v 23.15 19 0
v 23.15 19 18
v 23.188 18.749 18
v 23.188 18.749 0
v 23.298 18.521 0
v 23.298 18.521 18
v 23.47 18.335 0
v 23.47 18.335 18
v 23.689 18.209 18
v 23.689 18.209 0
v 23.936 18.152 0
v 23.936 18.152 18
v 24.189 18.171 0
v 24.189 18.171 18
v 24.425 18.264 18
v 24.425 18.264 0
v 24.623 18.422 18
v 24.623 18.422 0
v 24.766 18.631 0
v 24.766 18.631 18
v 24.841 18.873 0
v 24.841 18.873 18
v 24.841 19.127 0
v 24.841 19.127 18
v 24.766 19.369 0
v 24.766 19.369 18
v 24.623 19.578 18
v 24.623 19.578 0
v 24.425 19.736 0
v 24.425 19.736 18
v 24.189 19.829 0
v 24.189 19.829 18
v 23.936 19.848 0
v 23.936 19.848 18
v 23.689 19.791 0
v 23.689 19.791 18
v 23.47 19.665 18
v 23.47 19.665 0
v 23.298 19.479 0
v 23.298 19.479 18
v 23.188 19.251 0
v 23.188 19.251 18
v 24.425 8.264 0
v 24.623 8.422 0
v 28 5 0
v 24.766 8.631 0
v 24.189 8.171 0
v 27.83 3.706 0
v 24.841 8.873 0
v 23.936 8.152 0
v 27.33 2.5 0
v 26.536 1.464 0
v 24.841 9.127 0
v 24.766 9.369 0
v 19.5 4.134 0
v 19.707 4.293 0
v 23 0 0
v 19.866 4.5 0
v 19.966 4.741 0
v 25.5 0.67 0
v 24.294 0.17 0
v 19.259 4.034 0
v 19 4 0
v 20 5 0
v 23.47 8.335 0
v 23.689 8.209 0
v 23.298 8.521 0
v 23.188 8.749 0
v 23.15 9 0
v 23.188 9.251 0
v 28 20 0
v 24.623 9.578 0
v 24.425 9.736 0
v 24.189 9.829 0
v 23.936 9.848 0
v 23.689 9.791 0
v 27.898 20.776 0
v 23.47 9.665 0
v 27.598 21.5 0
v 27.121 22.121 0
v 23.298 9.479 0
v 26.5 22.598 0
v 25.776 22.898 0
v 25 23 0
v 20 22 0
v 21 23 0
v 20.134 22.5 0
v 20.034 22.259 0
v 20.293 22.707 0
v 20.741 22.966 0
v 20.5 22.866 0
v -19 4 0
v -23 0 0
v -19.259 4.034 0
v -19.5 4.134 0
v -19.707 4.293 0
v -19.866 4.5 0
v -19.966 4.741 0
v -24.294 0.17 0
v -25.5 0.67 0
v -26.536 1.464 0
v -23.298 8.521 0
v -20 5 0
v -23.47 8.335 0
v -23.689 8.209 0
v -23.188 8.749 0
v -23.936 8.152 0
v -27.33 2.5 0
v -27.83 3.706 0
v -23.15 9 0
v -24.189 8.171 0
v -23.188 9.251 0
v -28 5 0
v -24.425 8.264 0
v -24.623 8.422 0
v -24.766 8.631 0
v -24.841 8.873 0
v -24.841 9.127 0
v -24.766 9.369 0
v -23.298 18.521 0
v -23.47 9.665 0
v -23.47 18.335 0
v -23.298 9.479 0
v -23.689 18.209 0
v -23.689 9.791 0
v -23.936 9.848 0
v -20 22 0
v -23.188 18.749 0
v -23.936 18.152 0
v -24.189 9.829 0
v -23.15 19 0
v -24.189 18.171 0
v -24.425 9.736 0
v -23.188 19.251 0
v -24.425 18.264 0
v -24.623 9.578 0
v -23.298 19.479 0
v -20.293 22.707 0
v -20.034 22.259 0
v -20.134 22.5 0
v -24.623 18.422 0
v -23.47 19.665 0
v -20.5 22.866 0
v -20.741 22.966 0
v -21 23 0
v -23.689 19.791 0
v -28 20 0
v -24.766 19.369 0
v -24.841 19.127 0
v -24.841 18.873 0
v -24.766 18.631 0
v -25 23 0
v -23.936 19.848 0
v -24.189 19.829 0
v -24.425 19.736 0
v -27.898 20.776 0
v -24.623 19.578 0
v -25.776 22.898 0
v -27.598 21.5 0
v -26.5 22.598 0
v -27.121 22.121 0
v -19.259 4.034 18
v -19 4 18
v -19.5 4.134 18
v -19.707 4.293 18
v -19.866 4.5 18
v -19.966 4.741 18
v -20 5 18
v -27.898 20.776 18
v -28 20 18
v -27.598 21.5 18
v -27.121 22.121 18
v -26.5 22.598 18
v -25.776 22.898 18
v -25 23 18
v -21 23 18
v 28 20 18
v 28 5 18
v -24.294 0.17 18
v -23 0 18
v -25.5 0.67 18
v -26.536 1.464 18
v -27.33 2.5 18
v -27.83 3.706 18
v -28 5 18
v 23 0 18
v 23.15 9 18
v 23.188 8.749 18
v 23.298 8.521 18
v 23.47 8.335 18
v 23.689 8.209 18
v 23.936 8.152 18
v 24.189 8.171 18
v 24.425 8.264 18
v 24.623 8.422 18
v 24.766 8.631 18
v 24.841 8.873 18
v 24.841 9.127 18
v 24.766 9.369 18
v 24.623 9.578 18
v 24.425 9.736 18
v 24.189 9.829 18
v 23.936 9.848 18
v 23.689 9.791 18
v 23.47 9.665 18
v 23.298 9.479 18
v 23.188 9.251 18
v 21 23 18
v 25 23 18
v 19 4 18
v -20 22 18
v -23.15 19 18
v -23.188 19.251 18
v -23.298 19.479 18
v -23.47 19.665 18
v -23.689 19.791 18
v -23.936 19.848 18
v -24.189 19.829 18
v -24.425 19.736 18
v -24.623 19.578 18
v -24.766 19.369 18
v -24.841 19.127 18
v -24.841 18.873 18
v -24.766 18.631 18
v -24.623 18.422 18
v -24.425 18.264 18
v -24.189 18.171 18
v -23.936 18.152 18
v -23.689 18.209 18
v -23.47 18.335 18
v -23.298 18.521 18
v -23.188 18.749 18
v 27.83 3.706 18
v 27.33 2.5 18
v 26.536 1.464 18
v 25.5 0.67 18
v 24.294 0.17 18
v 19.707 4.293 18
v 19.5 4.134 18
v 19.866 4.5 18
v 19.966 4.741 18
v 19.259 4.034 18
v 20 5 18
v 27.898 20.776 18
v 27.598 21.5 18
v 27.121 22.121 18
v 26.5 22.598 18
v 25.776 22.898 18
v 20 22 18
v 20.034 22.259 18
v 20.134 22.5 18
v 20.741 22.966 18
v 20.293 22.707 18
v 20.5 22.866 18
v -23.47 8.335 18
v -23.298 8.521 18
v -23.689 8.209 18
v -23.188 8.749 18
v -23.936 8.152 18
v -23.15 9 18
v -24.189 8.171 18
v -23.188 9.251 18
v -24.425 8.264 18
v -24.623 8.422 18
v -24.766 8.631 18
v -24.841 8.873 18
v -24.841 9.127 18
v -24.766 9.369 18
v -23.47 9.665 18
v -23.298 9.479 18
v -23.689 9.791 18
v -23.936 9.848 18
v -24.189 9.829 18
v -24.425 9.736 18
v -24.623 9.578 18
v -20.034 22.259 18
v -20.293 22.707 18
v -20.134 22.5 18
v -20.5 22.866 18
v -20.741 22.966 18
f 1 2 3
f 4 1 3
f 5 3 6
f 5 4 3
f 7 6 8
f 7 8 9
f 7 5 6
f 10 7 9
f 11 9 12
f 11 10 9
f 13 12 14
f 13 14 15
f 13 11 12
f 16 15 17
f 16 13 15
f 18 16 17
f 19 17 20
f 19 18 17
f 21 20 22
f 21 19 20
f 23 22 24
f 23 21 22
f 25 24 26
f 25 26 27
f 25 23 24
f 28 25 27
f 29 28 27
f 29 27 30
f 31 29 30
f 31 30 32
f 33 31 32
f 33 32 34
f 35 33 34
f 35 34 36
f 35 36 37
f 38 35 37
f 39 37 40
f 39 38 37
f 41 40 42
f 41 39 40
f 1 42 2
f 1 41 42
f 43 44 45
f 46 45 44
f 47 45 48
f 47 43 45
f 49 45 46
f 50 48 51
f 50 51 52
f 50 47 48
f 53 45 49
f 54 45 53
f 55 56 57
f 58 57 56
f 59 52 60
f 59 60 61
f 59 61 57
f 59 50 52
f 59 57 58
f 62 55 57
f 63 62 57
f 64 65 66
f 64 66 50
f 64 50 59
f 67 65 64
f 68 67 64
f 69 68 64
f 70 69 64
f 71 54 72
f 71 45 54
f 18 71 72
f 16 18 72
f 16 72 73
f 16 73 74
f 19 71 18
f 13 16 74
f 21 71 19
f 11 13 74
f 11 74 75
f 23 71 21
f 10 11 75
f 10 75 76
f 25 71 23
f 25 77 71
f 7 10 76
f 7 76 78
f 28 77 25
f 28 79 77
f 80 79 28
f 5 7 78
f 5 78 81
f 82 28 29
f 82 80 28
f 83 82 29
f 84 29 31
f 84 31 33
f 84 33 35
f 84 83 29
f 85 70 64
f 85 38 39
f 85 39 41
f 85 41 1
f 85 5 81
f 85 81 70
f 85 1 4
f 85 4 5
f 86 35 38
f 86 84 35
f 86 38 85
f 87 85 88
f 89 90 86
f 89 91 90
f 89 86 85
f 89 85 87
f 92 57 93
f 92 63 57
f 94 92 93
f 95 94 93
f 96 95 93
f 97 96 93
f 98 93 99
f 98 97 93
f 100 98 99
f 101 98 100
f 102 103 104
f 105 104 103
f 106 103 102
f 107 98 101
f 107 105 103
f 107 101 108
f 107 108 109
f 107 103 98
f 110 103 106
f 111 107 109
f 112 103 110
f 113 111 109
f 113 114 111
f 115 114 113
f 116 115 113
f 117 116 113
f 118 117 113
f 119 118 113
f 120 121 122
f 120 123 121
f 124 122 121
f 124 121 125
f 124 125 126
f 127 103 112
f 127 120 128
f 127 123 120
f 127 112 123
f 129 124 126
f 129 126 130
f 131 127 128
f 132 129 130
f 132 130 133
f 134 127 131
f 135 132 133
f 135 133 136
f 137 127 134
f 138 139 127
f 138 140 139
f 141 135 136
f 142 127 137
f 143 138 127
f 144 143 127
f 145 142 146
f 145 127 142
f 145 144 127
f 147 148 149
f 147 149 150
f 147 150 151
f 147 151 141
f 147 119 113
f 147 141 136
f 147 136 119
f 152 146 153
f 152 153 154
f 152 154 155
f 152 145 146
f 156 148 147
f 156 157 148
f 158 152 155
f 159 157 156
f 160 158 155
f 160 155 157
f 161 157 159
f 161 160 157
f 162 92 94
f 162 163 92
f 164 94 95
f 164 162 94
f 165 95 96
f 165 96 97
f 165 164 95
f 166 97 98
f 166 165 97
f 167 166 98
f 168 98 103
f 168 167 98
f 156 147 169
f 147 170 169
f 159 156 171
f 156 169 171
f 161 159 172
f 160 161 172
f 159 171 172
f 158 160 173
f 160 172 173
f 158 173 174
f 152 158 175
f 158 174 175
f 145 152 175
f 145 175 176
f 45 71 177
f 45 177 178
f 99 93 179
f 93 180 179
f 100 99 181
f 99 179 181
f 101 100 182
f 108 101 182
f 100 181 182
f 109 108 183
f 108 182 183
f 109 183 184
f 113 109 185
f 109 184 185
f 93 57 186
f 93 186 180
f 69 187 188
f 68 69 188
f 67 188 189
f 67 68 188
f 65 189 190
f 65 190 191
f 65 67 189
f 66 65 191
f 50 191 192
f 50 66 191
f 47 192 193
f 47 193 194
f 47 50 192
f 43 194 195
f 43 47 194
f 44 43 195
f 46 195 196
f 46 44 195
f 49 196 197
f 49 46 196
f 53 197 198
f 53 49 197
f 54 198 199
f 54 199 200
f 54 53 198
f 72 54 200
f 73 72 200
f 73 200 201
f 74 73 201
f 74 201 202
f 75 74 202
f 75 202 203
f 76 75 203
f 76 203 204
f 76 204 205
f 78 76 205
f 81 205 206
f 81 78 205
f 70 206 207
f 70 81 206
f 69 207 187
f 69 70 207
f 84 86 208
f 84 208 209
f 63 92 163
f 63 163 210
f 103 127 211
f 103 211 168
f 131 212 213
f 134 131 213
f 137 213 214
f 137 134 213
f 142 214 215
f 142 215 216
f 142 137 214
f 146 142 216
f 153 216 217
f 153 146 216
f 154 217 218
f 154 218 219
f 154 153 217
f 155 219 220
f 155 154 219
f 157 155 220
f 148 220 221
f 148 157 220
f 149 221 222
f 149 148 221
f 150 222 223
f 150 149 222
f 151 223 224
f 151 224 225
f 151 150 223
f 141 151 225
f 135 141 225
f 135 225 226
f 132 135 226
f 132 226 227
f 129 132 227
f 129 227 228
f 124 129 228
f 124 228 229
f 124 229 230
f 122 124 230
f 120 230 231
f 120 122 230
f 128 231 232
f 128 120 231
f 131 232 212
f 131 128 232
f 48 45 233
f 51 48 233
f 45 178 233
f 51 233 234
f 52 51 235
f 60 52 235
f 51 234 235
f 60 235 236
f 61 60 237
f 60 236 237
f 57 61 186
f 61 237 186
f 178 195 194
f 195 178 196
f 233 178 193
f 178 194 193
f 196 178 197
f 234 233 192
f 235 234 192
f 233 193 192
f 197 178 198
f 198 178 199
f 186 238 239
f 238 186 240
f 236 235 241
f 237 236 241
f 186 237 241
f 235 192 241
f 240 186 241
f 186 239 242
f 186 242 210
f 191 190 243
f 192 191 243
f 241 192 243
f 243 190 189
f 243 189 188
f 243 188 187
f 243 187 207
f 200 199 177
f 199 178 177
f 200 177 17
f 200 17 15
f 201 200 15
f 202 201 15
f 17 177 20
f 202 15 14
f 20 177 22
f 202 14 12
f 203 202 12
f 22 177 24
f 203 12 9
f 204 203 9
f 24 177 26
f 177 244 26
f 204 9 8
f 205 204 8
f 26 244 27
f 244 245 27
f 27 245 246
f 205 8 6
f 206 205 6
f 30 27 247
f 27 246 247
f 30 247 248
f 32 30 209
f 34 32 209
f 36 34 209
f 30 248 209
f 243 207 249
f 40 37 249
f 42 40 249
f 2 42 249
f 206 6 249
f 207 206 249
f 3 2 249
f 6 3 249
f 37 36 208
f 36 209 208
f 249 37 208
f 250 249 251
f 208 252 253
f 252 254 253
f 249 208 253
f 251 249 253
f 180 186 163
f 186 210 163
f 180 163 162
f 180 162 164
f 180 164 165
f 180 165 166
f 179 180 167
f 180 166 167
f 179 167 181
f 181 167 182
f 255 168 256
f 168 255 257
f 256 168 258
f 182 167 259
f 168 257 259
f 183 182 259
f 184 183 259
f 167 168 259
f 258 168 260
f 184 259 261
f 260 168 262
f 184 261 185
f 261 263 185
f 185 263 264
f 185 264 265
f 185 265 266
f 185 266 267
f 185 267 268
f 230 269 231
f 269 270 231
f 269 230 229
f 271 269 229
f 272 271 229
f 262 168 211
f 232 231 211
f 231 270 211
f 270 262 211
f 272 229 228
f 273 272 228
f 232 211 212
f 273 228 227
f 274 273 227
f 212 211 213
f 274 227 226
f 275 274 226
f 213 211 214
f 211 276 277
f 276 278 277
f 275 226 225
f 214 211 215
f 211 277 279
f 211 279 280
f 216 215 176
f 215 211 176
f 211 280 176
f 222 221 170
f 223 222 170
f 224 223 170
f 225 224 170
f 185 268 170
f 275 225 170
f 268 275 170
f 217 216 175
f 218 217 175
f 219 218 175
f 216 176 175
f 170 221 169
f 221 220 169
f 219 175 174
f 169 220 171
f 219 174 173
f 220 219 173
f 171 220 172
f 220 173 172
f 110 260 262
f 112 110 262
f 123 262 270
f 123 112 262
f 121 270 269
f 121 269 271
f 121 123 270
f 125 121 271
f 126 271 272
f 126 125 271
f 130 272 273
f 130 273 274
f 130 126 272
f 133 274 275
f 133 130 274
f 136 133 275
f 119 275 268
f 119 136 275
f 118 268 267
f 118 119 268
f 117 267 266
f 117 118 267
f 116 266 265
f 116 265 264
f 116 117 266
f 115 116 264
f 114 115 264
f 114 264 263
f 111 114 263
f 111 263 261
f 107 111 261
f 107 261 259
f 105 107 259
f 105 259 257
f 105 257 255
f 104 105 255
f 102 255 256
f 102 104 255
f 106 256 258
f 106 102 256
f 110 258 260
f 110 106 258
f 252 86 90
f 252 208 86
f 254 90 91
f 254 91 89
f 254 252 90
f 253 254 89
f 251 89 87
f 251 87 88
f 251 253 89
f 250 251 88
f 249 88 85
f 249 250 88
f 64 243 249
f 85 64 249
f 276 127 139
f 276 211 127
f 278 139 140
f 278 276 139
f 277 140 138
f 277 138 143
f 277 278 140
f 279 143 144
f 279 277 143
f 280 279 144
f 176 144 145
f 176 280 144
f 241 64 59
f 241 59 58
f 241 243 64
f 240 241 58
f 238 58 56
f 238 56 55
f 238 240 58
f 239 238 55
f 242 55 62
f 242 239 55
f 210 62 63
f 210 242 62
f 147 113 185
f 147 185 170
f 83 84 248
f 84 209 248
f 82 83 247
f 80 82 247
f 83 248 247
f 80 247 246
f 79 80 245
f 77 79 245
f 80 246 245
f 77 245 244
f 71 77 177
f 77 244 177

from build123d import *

# Parameters (mm, degrees)
ESQUISSE1_R        = 0.85
BOSS_EXTRU_1_DEPTH = 18
CONG_1_R           = 1
CONG_2_R           = 3
CONG_3_R           = 5


with BuildPart() as part:
    # Esquisse1 → Boss.-Extru.1 (new body)
    with BuildSketch(Plane.XY):
        Polygon((20, 23), (28, 23), (28, 0), (-28, 0), (-28, 23), (-20, 23), (-20, 4), (20, 4), align=None)
        with Locations((-24, 19)):
            Circle(ESQUISSE1_R, mode=Mode.SUBTRACT)
        with Locations((-24, 9)):
            Circle(ESQUISSE1_R, mode=Mode.SUBTRACT)
        with Locations(Location((24, 9, 0), (0, 0, 180))):
            Circle(ESQUISSE1_R, mode=Mode.SUBTRACT)
        with Locations(Location((24, 19, 0), (0, 0, 180))):
            Circle(ESQUISSE1_R, mode=Mode.SUBTRACT)
    extrude(amount=BOSS_EXTRU_1_DEPTH)

    # Congé1
    cong_1_edges = [part.edges().sort_by_distance(p)[0] for p in [
        (-20, 23, 9),
        (-20, 4, 9),
        (20, 4, 9),
        (20, 23, 9),
    ]]
    fillet(cong_1_edges, radius=CONG_1_R)

    # Congé2
    cong_2_edges = [part.edges().sort_by_distance(p)[0] for p in [
        (-28, 23, 9),
        (28, 23, 9),
    ]]
    fillet(cong_2_edges, radius=CONG_2_R)

    # Congé3
    cong_3_edges = [part.edges().sort_by_distance(p)[0] for p in [
        (28, 0, 9),
        (-28, 0, 9),
    ]]
    fillet(cong_3_edges, radius=CONG_3_R)


solid = part.part
